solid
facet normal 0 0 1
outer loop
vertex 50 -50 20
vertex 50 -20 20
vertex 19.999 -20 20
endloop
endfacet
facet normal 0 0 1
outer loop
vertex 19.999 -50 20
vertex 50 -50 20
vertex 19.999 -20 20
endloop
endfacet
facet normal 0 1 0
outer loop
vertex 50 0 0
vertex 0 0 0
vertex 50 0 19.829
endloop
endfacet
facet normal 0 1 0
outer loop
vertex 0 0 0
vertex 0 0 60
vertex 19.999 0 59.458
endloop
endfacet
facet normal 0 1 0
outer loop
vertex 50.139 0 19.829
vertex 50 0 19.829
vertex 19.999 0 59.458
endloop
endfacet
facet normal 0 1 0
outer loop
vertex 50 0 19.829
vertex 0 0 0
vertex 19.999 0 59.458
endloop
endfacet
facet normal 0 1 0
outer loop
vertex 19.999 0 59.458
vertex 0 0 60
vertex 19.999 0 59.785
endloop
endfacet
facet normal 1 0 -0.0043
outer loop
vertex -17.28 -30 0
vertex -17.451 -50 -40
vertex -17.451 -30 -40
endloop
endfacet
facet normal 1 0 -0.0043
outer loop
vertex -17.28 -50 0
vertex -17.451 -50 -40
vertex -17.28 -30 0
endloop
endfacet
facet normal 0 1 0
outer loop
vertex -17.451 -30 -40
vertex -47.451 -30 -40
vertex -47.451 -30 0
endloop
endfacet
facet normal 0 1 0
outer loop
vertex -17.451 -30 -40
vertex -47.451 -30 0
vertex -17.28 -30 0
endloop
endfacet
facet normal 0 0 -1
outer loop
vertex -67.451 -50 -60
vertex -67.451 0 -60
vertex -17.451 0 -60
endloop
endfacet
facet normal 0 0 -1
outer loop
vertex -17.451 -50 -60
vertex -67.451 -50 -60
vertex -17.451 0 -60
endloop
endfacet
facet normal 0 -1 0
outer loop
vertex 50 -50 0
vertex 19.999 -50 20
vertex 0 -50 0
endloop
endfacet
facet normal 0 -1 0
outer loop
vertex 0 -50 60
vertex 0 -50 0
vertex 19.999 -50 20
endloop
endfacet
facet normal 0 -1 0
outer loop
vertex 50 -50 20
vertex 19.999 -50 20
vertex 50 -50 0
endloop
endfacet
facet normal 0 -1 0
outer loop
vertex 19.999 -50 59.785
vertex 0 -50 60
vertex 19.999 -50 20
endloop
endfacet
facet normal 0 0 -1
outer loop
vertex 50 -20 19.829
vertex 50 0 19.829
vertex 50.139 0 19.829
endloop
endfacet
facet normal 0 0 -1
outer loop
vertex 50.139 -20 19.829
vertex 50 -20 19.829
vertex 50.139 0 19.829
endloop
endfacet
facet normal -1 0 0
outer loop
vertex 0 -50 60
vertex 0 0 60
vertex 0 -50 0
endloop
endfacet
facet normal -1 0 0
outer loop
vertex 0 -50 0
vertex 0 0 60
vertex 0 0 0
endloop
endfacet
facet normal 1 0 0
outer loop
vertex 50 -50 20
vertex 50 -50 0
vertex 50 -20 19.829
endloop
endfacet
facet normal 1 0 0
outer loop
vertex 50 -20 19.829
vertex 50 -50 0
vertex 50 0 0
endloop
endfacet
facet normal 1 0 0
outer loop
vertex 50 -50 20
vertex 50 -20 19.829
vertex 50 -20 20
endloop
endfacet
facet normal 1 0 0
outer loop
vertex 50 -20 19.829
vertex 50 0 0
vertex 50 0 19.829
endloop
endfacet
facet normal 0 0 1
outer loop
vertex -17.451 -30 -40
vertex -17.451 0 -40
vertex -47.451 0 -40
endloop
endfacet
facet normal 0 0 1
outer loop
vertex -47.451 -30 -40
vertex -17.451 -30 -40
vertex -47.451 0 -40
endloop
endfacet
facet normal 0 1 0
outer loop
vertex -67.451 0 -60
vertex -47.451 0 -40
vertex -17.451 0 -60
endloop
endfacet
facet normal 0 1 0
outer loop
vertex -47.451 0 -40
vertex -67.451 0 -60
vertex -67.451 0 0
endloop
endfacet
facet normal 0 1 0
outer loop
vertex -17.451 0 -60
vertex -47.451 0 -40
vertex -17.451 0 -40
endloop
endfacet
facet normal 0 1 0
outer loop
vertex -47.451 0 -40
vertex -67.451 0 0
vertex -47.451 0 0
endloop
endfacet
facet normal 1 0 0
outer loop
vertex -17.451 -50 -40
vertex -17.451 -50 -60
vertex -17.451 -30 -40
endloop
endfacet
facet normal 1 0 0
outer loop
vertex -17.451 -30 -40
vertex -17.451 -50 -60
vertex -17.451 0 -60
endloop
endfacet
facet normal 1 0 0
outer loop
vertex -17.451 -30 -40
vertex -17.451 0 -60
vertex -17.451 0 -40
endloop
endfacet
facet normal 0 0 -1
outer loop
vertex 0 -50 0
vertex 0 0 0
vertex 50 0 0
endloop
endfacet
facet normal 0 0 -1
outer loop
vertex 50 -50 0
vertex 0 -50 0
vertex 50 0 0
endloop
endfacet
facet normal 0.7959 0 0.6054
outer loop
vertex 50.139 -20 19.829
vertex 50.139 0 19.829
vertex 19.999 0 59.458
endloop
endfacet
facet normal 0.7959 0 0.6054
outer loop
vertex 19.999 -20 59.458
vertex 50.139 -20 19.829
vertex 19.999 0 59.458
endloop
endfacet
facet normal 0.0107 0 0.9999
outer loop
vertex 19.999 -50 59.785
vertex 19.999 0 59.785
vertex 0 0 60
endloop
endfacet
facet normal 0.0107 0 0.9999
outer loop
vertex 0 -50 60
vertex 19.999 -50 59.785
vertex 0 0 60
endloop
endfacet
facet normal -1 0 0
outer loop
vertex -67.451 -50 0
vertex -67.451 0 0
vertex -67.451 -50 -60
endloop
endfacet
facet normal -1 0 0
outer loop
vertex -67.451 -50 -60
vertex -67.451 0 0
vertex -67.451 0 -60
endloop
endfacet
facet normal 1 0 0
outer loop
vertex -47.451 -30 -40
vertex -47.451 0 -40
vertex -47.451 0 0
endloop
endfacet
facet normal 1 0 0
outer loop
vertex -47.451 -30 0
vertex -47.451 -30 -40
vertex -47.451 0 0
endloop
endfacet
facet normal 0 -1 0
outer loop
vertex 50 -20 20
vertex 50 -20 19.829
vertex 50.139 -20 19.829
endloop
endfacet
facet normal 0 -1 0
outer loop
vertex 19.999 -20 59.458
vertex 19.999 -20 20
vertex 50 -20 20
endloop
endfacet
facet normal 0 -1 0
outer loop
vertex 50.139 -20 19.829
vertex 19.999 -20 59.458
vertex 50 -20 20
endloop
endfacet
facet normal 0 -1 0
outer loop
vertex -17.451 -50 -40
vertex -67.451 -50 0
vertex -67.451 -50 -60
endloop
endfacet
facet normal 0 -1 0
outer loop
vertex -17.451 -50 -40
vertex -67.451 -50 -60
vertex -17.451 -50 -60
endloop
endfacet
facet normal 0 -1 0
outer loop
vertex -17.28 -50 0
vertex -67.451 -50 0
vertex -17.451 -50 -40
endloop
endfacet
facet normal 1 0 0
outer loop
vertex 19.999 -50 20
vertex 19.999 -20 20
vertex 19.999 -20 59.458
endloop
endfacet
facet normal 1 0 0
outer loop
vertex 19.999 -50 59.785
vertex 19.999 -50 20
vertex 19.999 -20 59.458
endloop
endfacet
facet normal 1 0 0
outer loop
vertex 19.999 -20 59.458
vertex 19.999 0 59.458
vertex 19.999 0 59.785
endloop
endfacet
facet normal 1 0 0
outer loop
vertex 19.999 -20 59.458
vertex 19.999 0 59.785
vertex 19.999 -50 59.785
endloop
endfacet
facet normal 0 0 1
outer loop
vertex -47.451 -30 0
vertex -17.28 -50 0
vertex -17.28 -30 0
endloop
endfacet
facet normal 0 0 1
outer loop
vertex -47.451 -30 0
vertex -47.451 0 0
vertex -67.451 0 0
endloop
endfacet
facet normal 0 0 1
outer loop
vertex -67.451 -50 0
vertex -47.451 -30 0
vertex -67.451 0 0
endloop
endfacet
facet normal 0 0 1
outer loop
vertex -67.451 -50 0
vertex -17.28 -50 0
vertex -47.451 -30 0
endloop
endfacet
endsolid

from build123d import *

# Parameters (mm, degrees)
F1_DEPTH = 50
F3_DEPTH = 20
F5_DEPTH = 50
F7_DEPTH = 20


with BuildPart() as f1:
    # F0 (on Front) → F1 (new body)
    with BuildSketch(Plane.XZ):
        Polygon((0, 60), (0, 0), (50, 0), (50, 20), (19.998844, 20), (19.998844, 59.784958), align=None)
    extrude(amount=F1_DEPTH)

    # F2 (on face) → F3 (join)
    with BuildSketch(Plane.XZ):
        Polygon((50.13939, 19.829139), (19.998844, 59.458375), (19.998844, 20), (50, 20), (50, 19.829139), align=None)
    extrude(amount=F3_DEPTH)


with BuildPart() as f5:
    # F4 (on Front) → F5 (new body)
    with BuildSketch(Plane.XZ):
        Polygon((-47.450976, 0), (-67.450976, 0), (-67.450976, -60), (-17.450976, -60), (-17.450976, -40), (-47.450976, -40), align=None)
    extrude(amount=F5_DEPTH)

    # F6 (on face) → F7 (join)
    with BuildSketch(Plane.XZ.offset(50)):
        Polygon((-17.279677, 0), (-47.450976, 0), (-47.450976, -40), (-17.450976, -40), align=None)
    extrude(amount=-F7_DEPTH)


solid = Compound([f1.part, f5.part])
